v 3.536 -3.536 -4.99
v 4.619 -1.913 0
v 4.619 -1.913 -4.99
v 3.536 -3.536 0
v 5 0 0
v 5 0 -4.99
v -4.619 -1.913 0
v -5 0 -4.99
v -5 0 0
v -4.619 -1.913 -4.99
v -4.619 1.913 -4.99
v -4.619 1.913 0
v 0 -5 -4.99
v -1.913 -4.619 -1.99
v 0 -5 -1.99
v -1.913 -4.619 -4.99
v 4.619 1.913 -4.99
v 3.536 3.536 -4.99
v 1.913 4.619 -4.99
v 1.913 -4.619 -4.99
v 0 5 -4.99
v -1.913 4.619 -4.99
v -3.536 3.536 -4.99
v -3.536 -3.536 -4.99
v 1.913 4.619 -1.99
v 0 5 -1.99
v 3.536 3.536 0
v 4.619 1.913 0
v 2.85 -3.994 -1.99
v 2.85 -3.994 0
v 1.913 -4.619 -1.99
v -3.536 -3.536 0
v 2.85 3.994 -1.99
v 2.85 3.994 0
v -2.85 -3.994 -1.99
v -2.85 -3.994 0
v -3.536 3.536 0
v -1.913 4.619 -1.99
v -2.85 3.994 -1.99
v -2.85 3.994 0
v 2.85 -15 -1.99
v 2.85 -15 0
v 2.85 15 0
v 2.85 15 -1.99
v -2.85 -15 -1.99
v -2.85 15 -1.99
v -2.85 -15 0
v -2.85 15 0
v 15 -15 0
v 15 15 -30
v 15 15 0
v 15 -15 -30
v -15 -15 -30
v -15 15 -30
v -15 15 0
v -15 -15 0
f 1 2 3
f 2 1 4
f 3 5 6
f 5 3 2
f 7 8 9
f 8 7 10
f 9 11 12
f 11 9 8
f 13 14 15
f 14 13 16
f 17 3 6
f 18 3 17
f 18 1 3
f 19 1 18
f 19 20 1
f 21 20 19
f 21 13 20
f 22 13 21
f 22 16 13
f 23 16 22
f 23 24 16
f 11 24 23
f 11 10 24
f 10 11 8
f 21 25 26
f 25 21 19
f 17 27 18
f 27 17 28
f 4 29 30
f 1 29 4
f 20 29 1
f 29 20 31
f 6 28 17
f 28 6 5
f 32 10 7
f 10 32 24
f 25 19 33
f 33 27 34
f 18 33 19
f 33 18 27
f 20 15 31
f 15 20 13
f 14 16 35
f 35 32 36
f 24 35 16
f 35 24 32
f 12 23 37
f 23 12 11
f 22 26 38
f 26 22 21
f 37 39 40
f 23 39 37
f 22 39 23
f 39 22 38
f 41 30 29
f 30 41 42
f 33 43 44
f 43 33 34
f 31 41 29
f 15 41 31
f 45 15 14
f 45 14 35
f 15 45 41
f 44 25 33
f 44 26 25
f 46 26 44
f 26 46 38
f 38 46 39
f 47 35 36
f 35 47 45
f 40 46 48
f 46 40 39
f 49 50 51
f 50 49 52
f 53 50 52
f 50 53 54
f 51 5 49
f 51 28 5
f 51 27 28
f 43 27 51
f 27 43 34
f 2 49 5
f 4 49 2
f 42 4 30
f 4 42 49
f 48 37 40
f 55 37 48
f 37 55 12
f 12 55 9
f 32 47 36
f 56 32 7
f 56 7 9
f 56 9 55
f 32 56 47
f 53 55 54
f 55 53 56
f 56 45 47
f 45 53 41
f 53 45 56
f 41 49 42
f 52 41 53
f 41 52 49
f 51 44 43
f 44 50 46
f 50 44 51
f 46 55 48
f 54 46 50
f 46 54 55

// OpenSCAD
rotate([180,0,0]) difference() {
	translate([0,0,15]) cube([30,30,30],center=true);
	translate([0,0,2.49]) cutout();
} 

module cutout() {
	intersection() {
		cylinder(r=5, h=5, center=true);
		//rotate([0,0,90]) cube([18.5,8.5,8.5],center=true);		
	}
	translate([0,0,-1.5]) cube([5.7,50,2],center=true);
}
